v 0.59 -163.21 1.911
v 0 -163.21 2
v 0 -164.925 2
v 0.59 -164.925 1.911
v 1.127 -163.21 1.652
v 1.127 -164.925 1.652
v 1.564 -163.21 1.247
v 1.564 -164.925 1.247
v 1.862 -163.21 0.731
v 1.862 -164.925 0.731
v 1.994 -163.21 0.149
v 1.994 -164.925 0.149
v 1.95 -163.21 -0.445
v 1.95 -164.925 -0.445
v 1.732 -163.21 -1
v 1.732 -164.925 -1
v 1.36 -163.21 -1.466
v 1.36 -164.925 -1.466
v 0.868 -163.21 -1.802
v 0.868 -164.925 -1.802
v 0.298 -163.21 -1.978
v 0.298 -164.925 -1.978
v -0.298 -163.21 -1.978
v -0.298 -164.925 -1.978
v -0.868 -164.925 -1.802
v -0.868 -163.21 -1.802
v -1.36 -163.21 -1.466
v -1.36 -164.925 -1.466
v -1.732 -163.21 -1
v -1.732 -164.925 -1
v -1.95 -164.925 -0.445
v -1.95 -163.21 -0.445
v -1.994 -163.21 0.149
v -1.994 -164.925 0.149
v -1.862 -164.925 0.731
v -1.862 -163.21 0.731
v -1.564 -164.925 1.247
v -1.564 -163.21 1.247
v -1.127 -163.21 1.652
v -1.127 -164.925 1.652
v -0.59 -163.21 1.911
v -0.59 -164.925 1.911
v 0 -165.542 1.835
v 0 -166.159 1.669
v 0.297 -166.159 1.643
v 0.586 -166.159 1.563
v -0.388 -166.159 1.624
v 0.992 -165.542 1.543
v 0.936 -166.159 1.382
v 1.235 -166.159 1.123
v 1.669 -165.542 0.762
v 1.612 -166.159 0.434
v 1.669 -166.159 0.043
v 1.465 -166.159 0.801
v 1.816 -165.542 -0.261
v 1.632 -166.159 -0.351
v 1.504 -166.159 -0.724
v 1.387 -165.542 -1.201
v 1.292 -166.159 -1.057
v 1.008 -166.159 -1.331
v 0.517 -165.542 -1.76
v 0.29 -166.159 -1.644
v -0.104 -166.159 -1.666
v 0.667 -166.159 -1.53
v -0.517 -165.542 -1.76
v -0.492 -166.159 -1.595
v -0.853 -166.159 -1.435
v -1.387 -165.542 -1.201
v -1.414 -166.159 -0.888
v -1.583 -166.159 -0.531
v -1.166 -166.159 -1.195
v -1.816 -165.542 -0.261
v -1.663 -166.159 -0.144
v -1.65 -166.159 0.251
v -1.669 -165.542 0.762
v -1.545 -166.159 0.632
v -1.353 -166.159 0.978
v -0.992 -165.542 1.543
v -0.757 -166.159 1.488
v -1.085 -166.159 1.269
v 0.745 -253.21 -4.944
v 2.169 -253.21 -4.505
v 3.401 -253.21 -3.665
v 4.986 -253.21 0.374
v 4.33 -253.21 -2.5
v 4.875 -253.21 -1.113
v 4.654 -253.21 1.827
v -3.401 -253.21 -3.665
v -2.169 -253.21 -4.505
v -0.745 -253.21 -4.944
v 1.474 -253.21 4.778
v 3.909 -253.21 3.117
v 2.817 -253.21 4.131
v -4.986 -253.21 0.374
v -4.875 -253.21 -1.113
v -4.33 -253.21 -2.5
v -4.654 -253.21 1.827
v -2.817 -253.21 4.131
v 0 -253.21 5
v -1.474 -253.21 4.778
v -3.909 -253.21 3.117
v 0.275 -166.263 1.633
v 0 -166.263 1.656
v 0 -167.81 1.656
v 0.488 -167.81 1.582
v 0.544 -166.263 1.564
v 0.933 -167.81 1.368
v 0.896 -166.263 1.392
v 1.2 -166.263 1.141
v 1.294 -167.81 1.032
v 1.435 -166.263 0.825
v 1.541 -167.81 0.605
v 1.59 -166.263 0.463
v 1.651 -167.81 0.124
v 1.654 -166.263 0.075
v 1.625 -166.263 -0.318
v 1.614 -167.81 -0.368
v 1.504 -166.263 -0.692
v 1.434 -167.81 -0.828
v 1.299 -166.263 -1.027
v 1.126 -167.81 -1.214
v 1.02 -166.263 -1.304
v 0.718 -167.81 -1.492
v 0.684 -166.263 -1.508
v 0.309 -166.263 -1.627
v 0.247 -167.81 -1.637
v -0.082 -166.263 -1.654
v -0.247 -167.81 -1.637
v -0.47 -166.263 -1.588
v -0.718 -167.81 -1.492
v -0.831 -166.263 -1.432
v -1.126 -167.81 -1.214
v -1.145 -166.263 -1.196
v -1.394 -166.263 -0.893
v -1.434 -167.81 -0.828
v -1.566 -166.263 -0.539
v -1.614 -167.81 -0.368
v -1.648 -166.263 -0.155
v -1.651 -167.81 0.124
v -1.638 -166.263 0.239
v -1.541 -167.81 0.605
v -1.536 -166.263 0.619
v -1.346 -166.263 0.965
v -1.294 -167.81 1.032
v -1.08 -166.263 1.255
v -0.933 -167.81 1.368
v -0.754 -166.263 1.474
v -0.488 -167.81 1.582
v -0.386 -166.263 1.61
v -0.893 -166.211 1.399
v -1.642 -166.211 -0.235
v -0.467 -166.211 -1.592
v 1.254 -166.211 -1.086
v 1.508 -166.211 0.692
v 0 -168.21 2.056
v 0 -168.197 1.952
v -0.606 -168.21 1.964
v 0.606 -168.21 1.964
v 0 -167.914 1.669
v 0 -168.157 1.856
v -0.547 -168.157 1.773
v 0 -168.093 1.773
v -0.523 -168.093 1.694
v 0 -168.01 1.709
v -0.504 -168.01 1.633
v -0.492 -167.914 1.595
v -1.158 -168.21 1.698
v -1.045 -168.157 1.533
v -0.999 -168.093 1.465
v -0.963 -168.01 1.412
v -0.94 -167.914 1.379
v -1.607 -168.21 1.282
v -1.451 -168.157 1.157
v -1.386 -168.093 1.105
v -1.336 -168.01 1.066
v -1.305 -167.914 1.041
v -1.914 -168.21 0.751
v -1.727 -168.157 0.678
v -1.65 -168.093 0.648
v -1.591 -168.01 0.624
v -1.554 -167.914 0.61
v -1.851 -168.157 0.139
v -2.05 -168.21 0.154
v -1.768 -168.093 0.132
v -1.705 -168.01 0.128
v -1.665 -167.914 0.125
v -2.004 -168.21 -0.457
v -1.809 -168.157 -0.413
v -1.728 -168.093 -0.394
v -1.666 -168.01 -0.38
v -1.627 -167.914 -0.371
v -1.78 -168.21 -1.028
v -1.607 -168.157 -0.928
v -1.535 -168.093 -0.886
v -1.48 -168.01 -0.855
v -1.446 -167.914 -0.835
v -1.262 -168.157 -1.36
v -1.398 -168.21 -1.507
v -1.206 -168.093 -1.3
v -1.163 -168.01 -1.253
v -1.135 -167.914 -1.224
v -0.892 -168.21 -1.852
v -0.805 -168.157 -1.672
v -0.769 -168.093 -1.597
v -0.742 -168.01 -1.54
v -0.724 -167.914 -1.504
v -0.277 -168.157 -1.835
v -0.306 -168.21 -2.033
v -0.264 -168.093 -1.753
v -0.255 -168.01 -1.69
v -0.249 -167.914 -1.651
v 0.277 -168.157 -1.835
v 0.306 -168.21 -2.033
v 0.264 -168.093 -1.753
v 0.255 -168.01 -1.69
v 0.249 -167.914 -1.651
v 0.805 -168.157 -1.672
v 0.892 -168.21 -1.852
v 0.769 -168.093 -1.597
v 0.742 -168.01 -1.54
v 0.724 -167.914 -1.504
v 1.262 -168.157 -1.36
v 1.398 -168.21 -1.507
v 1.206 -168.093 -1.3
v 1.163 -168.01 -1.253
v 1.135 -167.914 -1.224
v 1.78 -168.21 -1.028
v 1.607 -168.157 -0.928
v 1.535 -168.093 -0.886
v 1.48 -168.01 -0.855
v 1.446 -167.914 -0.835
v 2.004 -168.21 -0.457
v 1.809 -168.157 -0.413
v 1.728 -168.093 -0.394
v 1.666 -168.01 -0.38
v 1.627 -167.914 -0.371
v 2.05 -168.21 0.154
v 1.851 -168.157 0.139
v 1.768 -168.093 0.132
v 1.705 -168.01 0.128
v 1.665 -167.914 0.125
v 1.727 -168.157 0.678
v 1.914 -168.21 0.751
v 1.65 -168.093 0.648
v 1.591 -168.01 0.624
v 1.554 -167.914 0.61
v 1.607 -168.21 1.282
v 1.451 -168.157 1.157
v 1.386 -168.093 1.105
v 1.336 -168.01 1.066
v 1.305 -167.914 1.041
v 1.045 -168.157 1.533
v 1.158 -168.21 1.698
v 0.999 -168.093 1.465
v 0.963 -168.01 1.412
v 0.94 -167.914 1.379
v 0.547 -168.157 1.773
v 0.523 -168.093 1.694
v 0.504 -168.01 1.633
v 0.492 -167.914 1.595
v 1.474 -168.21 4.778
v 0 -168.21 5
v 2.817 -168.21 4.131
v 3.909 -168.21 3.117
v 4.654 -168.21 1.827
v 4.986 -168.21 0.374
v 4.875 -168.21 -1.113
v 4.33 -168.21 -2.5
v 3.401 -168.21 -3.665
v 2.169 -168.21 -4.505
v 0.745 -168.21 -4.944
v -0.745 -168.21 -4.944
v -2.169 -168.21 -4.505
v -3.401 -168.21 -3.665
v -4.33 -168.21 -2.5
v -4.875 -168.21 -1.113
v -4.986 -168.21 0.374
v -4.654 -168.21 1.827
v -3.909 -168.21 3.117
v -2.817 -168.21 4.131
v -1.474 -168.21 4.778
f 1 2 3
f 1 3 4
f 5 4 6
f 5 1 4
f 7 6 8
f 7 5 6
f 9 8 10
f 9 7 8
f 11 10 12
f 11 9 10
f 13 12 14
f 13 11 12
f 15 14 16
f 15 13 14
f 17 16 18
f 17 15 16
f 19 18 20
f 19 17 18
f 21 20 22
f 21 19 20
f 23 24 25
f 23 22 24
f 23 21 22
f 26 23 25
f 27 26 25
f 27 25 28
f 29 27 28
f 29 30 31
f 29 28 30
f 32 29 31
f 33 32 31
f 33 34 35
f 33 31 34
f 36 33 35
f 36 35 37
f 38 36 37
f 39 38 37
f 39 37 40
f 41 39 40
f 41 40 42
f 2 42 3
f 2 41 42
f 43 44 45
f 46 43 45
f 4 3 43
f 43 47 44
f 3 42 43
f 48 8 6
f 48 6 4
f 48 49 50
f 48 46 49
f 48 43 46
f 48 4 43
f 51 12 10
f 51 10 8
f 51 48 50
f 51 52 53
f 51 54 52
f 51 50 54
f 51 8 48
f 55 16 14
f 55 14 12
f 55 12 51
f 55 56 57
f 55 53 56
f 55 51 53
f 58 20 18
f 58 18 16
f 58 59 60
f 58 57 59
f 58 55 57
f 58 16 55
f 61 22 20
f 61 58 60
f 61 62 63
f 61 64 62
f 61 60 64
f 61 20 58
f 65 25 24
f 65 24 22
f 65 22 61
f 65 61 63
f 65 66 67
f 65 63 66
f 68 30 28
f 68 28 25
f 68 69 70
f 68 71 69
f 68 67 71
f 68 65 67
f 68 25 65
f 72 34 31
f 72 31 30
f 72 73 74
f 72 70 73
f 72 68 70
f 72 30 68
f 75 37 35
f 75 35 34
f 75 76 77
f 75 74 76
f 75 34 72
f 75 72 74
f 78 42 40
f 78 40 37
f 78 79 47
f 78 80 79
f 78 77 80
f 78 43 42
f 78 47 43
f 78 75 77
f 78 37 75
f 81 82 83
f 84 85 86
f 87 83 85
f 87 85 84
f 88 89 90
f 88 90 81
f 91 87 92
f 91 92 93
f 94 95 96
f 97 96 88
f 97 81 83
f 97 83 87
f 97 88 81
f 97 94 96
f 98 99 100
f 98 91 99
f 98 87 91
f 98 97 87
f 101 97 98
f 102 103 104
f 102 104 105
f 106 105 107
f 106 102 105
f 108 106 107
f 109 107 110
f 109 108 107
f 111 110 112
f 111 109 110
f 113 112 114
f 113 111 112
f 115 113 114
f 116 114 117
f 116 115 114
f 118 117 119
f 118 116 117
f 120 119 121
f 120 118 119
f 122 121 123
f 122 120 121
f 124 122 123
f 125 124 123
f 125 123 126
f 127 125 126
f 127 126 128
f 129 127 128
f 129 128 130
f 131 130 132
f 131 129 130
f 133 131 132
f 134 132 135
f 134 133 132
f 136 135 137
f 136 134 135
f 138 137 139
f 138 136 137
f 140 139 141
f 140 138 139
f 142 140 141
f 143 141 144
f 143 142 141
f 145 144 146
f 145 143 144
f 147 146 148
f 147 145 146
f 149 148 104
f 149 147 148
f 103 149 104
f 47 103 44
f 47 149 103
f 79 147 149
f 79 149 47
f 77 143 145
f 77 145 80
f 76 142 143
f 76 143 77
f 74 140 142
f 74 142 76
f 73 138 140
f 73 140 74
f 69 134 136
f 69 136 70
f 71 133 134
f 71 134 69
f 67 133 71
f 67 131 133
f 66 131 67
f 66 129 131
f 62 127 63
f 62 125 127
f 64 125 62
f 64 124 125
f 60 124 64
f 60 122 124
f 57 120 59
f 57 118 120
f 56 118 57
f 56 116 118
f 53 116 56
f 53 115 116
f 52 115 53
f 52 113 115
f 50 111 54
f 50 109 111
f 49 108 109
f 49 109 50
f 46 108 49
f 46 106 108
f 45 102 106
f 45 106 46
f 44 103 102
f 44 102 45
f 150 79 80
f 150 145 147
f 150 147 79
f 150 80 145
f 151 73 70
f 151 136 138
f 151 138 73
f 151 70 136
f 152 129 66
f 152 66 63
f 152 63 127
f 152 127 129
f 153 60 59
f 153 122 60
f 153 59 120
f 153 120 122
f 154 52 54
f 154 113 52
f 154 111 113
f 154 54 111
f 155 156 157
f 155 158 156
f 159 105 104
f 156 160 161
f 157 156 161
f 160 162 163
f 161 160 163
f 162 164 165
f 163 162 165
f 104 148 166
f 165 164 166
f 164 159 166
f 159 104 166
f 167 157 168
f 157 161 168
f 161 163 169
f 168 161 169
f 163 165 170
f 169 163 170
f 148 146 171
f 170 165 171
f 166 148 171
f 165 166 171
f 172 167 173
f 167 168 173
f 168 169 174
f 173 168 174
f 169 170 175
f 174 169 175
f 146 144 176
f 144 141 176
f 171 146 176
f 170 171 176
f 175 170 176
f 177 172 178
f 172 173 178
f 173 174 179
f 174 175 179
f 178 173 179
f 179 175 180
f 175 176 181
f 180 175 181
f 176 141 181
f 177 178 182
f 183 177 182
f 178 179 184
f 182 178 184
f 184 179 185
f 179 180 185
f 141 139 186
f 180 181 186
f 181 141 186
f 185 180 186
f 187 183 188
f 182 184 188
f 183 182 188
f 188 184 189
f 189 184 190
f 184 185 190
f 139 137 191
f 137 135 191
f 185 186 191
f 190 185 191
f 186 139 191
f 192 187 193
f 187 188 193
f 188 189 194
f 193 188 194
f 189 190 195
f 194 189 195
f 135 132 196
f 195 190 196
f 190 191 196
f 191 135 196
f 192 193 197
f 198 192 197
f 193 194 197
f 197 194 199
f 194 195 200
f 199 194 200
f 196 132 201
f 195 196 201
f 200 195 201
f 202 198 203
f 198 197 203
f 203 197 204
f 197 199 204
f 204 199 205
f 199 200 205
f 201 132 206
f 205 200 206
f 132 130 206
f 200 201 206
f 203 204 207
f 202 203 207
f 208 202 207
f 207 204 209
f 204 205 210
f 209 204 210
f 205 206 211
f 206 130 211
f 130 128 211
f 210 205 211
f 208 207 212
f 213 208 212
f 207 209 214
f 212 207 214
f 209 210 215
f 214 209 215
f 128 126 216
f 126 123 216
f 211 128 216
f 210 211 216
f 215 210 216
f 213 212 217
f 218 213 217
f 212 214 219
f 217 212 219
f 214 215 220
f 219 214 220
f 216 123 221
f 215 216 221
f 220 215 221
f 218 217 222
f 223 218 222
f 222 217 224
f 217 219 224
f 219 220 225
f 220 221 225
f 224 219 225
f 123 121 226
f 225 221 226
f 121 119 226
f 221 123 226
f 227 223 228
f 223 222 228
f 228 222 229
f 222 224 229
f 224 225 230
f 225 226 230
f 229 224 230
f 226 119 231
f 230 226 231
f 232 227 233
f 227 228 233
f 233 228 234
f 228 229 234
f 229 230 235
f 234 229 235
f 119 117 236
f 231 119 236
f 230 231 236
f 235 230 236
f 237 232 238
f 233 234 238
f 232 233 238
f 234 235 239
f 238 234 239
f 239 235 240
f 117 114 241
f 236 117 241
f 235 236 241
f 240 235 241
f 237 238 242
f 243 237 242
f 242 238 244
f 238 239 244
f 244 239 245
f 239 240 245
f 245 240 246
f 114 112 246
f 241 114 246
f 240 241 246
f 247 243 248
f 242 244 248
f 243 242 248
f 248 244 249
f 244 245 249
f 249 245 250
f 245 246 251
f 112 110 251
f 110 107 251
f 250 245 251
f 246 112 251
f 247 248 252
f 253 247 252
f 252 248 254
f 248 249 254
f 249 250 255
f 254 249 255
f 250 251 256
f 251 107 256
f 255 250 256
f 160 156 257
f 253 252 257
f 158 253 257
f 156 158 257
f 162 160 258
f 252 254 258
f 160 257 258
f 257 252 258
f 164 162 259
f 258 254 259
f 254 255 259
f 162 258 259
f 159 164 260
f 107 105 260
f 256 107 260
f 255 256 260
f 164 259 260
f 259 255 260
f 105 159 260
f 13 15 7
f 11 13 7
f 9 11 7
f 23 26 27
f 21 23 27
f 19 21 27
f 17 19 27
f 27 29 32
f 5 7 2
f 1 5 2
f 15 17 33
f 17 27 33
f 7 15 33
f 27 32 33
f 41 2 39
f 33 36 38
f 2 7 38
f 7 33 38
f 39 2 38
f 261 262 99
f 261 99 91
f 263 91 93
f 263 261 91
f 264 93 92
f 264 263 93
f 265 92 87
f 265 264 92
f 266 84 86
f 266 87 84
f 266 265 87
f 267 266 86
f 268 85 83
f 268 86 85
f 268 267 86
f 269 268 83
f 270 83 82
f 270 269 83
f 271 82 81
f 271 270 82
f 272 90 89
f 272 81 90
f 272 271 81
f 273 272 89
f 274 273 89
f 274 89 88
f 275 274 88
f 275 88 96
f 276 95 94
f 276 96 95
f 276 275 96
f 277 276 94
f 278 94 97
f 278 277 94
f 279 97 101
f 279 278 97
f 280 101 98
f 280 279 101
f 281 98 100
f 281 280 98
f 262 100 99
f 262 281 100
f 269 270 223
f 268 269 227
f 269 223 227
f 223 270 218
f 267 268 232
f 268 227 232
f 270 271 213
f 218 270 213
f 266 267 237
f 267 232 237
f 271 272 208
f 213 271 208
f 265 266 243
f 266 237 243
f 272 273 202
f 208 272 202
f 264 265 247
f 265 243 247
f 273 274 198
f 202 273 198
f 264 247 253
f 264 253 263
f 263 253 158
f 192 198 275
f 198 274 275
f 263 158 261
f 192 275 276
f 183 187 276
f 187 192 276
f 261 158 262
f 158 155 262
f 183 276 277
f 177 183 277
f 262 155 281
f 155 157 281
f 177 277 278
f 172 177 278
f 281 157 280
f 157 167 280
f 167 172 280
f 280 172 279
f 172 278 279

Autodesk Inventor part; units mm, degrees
ref_plane "YZ Plane" through (0, 0, 0) normal (1, 0, 0) x (0, 1, 0)
ref_plane "XZ Plane" through (0, 0, 0) normal (0, 1, 0) x (-1, 0, 0)
ref_plane "XY Plane" through (0, 0, 0) normal (0, 0, 1) x (1, 0, 0)
sketch "Skizze6" plane through (0, 0, 0) normal (1, 0, 0) x (0, 1, 0)
  line L0 (-253.2103, 0) -> (-253.2103, 5)
  line L1 (-253.2103, 5) -> (-168.2103, 5)
  line L2 (-168.2103, 5) -> (-168.2103, 1.6557)
  line L3 (-168.2103, 1.6557) -> (-166.2103, 1.6557)
  line L4 (-166.2103, 1.6557) -> (-164.9254, 2)
  line L5 (-164.9254, 2) -> (-163.2103, 2)
  line L6 (-163.2103, 2) -> (-163.2103, 0)
  line L7 (-163.2103, 0) -> (-253.2103, 0)
  point P0 (0, 0)
  dimension "d31" = 5
  dimension "d32" = 85
  dimension "d33" = 5
  dimension "d34" = 2
  dimension "d35" = 15
  dimension "d36" = 2
revolve "Umdrehung1" add sketch "Skizze6" angle 360 about axis through (0, -163.2103, 0) along (0, -1, 0)
thread "Gewinde2" size "M4x0.7" class "6g" standard "ANSI Metric M Profile" full length
fillet "Rundung6" radius 0.4 2 edges at (0, -166.2103, -1.6557) (0, -168.2103, -1.6557)
properties part number "TS_V1_Fallmagazin_Blech_int"
